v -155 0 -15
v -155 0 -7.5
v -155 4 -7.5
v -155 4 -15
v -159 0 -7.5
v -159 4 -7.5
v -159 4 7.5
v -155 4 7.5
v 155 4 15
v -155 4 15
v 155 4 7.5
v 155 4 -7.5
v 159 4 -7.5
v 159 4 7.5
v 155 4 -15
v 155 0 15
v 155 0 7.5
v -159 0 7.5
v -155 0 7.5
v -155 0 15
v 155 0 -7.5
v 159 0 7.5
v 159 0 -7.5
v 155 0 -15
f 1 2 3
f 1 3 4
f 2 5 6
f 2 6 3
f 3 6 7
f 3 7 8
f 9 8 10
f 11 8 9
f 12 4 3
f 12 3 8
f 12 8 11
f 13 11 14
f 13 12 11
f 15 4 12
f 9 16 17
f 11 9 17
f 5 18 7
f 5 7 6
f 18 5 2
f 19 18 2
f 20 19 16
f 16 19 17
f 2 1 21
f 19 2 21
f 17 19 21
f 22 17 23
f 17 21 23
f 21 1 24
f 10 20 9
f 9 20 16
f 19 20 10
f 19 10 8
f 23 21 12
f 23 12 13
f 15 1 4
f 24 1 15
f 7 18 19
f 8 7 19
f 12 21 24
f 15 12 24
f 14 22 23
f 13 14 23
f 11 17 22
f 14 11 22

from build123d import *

# Parameters (mm, degrees)
SCHIZZO1_W                   = 310
SCHIZZO1_H                   = 30
SCHIZZO1_W_2                 = 4
SCHIZZO1_H_2                 = 15
ESTRUSIONE_ESTRUSIONE1_DEPTH = 4


with BuildPart() as part:
    # Schizzo1 → Estrusione-Estrusione1 (new body)
    with BuildSketch(Plane(origin=(0, 0, 0), x_dir=(1, 0, 0), z_dir=(0, 1, 0))):
        Rectangle(SCHIZZO1_W, SCHIZZO1_H)
        with Locations((-157, 0)):
            Rectangle(SCHIZZO1_W_2, SCHIZZO1_H_2)
        with Locations((157, 0)):
            Rectangle(SCHIZZO1_W_2, SCHIZZO1_H_2)
    extrude(amount=ESTRUSIONE_ESTRUSIONE1_DEPTH)


solid = part.part
